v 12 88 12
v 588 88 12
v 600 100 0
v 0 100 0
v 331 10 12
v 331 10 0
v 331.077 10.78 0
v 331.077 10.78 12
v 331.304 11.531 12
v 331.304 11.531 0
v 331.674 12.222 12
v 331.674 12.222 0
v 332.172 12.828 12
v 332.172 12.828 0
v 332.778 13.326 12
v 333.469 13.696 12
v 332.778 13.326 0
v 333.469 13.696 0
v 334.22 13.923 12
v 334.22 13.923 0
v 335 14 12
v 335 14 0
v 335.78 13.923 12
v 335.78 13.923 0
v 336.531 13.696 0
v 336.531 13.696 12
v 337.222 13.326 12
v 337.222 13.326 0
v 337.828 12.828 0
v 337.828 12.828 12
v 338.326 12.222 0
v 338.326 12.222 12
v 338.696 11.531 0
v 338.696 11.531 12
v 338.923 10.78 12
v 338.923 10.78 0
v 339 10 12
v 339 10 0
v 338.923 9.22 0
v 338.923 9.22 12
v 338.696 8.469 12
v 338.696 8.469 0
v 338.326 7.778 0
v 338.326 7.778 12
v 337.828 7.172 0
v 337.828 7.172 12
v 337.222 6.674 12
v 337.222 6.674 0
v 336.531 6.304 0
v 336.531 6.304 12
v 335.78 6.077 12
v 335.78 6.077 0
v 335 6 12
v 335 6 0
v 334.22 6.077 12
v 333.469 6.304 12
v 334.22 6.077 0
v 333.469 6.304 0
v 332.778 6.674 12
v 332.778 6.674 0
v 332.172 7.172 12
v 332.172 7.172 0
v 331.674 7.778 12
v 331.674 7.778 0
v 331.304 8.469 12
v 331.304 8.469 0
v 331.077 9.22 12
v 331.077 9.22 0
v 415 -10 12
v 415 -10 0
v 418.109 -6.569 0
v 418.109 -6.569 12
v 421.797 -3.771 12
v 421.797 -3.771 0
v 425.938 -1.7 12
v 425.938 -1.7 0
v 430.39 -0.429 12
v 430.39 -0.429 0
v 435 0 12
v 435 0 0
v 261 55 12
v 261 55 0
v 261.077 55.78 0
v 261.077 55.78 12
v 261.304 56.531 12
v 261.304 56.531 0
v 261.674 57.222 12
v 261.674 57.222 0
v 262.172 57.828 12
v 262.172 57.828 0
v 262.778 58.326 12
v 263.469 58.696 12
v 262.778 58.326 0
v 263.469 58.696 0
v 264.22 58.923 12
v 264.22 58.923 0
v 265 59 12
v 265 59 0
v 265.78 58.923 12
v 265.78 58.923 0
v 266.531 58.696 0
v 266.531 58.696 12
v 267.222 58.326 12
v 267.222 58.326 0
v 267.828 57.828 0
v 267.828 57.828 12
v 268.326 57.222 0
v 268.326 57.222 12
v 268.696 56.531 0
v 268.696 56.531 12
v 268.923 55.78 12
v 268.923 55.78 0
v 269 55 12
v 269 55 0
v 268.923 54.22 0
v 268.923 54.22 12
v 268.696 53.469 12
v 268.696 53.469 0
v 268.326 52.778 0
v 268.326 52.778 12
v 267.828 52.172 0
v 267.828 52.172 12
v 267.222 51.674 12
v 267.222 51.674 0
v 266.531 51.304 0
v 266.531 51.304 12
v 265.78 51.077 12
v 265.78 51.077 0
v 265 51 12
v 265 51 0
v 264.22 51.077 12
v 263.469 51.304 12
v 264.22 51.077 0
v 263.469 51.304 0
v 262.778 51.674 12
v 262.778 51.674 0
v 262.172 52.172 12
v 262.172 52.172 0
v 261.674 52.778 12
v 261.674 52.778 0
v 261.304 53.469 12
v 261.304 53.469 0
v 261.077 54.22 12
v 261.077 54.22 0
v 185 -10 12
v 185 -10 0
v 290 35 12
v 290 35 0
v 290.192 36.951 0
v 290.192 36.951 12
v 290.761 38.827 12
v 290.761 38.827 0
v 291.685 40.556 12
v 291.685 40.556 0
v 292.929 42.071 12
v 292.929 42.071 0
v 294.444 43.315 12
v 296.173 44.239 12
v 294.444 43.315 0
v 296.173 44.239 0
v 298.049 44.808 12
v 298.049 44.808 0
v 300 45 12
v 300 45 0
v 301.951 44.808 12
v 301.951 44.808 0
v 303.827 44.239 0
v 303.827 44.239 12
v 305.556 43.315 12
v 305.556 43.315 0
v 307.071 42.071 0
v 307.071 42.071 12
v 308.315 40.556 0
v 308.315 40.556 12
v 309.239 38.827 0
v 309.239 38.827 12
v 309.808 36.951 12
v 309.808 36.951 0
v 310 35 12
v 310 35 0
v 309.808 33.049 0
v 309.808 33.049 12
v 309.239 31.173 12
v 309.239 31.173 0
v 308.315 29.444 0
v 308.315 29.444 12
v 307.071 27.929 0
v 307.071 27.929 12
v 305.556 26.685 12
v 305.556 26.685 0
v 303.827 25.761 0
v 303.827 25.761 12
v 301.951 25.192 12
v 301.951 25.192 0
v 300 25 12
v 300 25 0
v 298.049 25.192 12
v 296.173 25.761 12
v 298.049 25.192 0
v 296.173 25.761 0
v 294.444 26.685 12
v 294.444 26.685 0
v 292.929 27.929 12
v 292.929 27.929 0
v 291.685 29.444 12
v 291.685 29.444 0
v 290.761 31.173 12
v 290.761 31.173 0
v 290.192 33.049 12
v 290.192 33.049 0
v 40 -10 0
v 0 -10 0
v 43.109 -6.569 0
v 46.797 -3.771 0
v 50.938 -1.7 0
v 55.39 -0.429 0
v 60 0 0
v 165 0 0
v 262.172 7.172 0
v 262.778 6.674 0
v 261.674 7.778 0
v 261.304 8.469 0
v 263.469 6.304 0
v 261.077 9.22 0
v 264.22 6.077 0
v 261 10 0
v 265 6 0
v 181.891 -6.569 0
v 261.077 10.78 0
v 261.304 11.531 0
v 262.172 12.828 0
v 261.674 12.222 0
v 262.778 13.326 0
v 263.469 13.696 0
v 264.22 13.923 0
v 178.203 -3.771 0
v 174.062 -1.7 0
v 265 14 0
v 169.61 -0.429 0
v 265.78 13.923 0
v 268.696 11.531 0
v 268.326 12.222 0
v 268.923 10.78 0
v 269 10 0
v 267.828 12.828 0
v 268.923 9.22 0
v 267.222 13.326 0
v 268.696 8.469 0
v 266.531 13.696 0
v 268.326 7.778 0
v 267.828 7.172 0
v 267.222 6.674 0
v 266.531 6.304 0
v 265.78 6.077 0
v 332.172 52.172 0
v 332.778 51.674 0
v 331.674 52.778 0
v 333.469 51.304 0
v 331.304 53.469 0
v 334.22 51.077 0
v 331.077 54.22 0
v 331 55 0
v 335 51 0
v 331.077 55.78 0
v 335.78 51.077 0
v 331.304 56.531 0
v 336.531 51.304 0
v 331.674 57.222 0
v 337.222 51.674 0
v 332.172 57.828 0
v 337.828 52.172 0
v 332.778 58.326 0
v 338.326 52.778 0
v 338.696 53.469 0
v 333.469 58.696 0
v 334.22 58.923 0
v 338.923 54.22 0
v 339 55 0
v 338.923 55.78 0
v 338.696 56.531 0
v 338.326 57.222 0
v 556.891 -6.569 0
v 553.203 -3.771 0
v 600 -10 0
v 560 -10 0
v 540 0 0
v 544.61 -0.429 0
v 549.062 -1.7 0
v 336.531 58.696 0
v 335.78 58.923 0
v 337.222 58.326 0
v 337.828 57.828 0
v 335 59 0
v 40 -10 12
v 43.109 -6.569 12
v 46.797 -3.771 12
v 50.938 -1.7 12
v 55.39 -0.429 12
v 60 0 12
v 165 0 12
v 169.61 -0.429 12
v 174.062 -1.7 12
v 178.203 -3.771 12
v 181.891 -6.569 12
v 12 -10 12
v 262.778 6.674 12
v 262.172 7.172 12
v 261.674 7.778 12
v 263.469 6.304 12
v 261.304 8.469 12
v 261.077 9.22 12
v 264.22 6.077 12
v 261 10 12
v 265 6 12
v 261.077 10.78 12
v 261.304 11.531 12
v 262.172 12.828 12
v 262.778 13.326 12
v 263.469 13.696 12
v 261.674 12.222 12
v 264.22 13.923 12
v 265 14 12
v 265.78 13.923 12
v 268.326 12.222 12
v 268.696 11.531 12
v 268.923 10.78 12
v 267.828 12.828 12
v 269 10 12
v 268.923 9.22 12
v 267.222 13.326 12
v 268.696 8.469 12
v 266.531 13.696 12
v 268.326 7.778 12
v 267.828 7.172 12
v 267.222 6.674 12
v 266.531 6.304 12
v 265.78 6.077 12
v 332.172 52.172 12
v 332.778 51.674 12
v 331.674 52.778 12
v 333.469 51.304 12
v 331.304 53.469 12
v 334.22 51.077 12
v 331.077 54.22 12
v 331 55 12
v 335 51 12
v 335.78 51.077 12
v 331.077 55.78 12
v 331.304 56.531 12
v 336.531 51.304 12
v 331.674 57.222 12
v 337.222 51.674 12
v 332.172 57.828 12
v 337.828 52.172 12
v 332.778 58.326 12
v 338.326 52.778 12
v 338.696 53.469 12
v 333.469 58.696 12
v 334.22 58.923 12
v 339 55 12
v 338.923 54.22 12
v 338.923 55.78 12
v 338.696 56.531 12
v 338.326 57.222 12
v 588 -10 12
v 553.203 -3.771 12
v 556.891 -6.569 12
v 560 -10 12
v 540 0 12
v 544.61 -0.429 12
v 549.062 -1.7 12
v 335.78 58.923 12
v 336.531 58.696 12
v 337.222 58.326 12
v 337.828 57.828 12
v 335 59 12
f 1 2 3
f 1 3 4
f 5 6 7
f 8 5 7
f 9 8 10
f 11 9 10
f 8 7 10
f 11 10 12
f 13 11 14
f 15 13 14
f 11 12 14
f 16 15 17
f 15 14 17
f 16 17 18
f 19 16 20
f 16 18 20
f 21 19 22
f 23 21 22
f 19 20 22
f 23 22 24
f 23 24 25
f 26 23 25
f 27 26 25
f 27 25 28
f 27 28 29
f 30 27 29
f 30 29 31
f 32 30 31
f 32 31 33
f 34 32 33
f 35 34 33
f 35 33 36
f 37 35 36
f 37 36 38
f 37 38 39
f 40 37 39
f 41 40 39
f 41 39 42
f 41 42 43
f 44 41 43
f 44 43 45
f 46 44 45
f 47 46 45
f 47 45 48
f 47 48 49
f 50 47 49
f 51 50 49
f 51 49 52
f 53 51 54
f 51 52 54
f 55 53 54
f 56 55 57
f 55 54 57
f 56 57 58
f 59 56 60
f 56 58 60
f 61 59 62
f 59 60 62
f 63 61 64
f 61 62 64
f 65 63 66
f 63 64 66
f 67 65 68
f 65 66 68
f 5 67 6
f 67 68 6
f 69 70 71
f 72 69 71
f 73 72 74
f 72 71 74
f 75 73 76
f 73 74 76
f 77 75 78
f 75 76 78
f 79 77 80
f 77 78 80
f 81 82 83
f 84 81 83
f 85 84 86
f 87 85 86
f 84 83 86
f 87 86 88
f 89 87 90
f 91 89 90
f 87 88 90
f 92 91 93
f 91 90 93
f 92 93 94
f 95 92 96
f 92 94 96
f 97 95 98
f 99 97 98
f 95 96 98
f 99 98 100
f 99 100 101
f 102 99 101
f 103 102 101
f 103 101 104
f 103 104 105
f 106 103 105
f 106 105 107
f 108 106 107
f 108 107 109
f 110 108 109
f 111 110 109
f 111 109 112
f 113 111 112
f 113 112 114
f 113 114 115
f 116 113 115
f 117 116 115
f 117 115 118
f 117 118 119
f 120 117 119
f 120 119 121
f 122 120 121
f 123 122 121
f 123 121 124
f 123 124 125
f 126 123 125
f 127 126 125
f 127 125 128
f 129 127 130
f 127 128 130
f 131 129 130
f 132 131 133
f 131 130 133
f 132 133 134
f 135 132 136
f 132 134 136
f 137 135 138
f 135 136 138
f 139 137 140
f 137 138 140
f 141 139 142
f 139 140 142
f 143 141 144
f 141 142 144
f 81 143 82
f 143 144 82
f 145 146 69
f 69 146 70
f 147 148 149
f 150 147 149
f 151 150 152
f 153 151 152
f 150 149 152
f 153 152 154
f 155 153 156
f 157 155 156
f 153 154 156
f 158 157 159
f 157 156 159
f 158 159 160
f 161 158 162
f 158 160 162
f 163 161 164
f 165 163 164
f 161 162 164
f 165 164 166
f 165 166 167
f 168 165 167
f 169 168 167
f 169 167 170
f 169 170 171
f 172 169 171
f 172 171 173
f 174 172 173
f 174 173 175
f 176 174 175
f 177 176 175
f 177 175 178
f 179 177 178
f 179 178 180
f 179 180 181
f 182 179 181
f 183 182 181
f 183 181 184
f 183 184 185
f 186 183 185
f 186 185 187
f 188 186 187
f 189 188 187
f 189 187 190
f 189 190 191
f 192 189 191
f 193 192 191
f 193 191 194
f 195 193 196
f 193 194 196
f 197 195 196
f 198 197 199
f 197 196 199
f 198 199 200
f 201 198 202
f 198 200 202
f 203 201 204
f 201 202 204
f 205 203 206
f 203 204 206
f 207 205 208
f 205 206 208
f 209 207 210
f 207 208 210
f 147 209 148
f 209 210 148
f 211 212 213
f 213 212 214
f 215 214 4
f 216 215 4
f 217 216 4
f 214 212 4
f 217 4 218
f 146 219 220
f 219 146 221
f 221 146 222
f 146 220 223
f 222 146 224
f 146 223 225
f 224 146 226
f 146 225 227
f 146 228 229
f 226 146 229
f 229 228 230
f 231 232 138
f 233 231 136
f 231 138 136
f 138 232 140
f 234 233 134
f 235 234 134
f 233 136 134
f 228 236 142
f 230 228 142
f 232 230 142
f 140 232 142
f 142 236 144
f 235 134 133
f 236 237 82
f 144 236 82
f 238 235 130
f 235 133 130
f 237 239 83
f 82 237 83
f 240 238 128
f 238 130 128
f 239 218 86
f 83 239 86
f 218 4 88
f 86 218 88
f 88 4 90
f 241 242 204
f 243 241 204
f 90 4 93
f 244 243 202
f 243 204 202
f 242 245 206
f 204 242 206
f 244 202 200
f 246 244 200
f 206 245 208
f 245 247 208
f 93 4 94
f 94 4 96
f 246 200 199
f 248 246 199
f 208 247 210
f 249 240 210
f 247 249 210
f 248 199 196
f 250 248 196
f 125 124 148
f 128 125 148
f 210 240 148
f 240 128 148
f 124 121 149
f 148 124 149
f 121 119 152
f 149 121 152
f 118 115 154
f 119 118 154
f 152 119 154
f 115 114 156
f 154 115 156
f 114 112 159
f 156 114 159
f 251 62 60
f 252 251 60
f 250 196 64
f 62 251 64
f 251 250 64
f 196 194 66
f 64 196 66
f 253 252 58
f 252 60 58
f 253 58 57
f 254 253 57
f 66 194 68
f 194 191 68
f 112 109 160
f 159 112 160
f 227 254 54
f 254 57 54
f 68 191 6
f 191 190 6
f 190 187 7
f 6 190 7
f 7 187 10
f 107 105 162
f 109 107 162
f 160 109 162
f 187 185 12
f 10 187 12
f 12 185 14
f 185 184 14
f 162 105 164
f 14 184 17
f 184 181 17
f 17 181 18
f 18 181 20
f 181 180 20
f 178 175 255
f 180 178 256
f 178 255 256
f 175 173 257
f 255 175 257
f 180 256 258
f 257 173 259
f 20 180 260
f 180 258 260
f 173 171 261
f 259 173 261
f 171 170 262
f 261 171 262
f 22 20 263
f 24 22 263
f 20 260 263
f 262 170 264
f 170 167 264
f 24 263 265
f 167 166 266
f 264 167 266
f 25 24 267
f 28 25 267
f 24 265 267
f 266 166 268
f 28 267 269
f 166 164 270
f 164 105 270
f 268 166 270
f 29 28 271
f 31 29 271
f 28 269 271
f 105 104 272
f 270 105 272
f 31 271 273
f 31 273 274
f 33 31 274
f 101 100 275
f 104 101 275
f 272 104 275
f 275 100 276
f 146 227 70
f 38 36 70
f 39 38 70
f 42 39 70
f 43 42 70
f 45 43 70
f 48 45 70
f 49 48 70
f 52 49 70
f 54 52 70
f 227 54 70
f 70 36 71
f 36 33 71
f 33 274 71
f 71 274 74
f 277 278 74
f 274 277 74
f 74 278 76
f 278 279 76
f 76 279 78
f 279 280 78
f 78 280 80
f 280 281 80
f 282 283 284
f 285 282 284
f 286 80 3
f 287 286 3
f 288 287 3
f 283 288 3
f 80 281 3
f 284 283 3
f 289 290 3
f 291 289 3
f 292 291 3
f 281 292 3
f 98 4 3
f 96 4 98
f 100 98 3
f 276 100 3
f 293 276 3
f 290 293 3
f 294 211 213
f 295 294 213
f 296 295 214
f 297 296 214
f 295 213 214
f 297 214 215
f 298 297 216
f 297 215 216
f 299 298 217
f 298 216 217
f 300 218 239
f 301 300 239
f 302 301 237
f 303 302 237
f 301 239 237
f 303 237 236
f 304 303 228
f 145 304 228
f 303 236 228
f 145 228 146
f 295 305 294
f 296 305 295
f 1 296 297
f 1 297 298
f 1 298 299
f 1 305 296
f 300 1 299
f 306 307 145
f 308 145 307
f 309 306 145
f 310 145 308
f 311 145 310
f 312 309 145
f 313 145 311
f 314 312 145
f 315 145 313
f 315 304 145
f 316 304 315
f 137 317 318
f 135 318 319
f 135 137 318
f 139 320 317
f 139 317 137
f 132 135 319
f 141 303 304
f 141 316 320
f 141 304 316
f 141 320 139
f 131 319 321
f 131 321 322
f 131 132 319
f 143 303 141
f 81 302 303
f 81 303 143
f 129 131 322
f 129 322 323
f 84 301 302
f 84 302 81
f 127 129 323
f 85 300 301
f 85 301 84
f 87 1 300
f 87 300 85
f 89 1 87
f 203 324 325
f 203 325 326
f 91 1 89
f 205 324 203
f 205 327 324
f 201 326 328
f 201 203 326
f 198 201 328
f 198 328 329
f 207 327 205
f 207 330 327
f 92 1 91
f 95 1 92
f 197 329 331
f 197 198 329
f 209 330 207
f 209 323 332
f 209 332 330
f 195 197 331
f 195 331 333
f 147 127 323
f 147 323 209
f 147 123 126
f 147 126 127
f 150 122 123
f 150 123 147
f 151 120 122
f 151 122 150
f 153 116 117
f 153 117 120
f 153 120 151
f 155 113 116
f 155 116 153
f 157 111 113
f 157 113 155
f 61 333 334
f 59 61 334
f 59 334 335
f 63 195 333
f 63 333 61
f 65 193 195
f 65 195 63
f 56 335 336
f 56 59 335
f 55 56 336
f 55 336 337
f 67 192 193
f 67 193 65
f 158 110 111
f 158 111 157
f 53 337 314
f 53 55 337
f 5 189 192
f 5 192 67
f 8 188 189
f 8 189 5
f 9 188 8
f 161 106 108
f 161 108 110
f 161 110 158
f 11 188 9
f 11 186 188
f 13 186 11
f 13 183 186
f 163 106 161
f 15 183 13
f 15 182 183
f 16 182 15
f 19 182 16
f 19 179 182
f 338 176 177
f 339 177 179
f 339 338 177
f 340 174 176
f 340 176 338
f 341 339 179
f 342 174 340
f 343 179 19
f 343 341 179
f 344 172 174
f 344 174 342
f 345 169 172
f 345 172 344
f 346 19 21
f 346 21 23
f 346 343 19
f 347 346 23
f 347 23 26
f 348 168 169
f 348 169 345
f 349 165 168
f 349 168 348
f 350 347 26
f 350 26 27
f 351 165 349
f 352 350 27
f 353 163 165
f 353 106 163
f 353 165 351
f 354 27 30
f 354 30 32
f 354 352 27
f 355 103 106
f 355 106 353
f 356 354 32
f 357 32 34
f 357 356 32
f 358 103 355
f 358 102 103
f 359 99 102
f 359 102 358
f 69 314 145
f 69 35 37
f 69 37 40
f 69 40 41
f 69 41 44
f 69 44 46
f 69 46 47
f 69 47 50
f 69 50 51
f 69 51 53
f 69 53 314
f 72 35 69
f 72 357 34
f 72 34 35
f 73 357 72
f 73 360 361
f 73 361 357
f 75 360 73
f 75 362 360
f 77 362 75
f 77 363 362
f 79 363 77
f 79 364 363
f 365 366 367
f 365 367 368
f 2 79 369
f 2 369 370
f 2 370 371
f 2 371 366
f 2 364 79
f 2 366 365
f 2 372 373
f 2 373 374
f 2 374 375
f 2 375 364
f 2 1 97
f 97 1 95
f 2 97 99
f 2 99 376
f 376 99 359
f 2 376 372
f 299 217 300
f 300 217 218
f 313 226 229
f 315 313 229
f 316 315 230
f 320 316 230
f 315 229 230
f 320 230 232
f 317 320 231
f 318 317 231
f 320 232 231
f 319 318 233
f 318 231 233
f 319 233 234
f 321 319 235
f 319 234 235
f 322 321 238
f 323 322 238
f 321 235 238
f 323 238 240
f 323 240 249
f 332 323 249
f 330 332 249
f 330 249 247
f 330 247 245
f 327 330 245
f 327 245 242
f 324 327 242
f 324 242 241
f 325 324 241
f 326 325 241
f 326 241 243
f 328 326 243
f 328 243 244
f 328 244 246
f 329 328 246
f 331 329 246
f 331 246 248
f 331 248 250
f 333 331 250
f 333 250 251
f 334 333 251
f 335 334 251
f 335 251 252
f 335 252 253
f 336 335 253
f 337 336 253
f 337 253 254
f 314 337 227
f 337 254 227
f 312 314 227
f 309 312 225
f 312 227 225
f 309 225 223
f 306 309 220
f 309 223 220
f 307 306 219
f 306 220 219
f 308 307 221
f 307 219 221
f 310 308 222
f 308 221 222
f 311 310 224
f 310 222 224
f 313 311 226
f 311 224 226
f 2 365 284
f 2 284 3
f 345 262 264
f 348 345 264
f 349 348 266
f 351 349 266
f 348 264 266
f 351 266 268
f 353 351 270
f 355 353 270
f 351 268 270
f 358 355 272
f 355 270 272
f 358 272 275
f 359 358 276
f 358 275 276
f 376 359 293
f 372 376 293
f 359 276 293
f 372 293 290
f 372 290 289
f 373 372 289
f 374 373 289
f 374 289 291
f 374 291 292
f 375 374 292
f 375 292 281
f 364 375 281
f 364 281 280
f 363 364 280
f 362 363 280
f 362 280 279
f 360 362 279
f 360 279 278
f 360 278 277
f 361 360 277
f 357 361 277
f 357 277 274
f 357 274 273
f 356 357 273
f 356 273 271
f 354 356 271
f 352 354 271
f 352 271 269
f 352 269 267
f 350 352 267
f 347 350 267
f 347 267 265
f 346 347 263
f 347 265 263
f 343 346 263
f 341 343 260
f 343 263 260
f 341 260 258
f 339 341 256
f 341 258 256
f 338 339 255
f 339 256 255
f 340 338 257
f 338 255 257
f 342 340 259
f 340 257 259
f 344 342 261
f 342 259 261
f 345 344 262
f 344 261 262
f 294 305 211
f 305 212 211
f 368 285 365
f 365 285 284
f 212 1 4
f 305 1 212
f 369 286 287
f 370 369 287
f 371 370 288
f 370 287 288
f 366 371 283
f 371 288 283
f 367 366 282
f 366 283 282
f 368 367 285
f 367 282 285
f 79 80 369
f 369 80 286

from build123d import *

# Parameters (mm, degrees)
BOSS_EXTRUDE1_DEPTH = 12
CHAMFER1_SIZE       = 12
SKETCH2_R           = 4
SKETCH2_R_2         = 10
CUT_EXTRUDE1_DEPTH  = 609.394608786


with BuildPart() as part:
    # Sketch1 → Boss-Extrude1 (new body)
    with BuildSketch(Plane.XY):
        with BuildLine():
            Line((0, 0), (0, -10))
            Line((0, -10), (40, -10))
            ThreePointArc((40, -10), (48.819660113, -2.639320225), (60, 0))
            Line((60, 0), (165, 0))
            ThreePointArc((165, 0), (176.180339887, -2.639320225), (185, -10))
            Line((185, -10), (415, -10))
            ThreePointArc((415, -10), (423.819660113, -2.639320225), (435, 0))
            Line((435, 0), (540, 0))
            ThreePointArc((540, 0), (551.180339887, -2.639320225), (560, -10))
            Line((560, -10), (600, -10))
            Line((600, -10), (600, 0))
            Line((600, 0), (600, 100))
            Line((600, 100), (0, 100))
            Line((0, 100), (0, 0))
        make_face()
    extrude(amount=BOSS_EXTRUDE1_DEPTH)

    # Chamfer1
    chamfer1_edges = [part.edges().sort_by_distance(p)[0] for p in [
        (300, 100, 12),
        (600, 45, 12),
        (0, 45, 12),
    ]]
    chamfer(chamfer1_edges, length=CHAMFER1_SIZE - 0.0001)  # a hair under: the kernel refuses the full size

    # Sketch2 → Cut-Extrude1 (cut, through all)
    with BuildSketch(Plane(origin=(0, 0, 0), x_dir=(-1, 0, 0), z_dir=(0, 0, -1))):
        with Locations((-335, 55)):
            Circle(SKETCH2_R)
        with Locations((-300, 35)):
            Circle(SKETCH2_R_2)
        with Locations((-265, 55)):
            Circle(SKETCH2_R)
        with Locations((-335, 10)):
            Circle(SKETCH2_R)
        with Locations((-265, 10)):
            Circle(SKETCH2_R)
    extrude(amount=-CUT_EXTRUDE1_DEPTH, mode=Mode.SUBTRACT)


solid = part.part
